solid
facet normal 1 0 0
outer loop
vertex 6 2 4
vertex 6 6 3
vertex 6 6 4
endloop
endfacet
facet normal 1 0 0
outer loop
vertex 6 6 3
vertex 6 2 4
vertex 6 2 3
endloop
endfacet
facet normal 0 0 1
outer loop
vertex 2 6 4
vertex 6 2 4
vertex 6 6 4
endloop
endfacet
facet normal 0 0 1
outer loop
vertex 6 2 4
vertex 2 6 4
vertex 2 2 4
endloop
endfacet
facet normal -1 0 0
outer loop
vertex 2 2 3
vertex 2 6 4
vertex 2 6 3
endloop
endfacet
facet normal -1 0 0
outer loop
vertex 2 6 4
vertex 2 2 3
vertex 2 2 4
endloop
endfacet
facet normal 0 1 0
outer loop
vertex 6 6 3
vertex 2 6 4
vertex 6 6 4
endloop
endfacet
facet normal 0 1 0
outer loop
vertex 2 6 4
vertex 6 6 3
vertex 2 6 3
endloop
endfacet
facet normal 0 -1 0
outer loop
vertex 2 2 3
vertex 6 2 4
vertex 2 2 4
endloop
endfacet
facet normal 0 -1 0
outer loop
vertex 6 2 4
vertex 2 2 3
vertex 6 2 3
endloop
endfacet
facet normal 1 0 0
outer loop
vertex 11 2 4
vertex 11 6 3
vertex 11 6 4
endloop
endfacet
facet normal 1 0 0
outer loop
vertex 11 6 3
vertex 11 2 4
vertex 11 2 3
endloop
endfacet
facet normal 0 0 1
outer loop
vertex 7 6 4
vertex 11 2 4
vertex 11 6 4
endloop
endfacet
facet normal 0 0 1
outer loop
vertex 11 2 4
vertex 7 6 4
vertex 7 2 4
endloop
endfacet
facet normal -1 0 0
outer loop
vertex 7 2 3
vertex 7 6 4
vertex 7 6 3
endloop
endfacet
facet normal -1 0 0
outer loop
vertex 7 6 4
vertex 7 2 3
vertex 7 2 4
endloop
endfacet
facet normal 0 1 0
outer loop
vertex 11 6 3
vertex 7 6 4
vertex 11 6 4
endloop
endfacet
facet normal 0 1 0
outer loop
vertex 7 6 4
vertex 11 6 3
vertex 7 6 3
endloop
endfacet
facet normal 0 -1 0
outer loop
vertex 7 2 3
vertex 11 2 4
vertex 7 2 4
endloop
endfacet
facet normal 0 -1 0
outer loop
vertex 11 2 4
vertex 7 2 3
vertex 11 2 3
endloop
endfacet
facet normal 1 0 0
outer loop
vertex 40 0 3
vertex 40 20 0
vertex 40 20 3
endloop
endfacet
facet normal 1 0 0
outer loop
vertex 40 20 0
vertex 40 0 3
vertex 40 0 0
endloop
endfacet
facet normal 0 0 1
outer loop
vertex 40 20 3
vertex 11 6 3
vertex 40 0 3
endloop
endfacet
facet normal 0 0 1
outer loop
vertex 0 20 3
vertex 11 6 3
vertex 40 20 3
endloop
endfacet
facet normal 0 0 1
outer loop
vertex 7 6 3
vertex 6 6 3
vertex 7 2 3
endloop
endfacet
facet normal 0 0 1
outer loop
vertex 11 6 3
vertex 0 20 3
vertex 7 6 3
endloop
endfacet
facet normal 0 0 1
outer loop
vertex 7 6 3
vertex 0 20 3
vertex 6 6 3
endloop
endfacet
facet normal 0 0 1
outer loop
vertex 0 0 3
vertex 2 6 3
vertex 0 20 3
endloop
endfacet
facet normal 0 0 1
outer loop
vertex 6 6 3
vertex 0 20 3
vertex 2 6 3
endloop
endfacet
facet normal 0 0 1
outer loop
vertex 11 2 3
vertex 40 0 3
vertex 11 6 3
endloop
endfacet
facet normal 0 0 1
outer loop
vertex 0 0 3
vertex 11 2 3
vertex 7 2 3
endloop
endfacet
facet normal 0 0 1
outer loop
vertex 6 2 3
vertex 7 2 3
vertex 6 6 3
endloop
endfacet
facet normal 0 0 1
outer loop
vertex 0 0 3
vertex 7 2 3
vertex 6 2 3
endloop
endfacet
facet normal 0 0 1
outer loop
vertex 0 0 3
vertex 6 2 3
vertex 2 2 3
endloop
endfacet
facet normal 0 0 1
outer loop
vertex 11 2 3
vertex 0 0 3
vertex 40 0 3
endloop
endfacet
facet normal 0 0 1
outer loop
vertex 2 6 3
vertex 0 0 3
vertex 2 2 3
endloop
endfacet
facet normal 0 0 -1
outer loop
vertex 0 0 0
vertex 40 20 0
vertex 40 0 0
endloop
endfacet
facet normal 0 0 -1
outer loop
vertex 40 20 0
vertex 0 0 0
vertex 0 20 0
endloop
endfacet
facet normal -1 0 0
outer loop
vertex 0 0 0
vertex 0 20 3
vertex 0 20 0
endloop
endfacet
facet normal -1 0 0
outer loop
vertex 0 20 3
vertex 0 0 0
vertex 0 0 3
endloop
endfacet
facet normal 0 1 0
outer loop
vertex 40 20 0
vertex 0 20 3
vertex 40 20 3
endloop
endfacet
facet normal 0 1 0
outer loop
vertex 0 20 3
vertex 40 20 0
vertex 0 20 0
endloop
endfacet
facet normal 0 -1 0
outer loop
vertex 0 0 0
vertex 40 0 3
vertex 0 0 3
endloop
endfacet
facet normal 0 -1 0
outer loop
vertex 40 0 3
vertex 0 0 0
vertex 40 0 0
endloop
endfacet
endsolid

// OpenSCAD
// Typed Preset - Test Fixture
// A plate with one raised block per letter of its label. Its presets set the
// plate's size and leave the label alone.

/*[Sign]*/
label = "HI"; //
width = 40; // [20:1:120]
height = 20; // [10:1:60]
depth = 3; // [1:1:10]

cube([width, height, depth]);
// Each block sinks 0.01 mm into the plate so the two share no face.
for (i = [0:len(label) - 1])
    translate([2 + i * 5, 2, depth - 0.01]) cube([4, 4, 1.01]);
